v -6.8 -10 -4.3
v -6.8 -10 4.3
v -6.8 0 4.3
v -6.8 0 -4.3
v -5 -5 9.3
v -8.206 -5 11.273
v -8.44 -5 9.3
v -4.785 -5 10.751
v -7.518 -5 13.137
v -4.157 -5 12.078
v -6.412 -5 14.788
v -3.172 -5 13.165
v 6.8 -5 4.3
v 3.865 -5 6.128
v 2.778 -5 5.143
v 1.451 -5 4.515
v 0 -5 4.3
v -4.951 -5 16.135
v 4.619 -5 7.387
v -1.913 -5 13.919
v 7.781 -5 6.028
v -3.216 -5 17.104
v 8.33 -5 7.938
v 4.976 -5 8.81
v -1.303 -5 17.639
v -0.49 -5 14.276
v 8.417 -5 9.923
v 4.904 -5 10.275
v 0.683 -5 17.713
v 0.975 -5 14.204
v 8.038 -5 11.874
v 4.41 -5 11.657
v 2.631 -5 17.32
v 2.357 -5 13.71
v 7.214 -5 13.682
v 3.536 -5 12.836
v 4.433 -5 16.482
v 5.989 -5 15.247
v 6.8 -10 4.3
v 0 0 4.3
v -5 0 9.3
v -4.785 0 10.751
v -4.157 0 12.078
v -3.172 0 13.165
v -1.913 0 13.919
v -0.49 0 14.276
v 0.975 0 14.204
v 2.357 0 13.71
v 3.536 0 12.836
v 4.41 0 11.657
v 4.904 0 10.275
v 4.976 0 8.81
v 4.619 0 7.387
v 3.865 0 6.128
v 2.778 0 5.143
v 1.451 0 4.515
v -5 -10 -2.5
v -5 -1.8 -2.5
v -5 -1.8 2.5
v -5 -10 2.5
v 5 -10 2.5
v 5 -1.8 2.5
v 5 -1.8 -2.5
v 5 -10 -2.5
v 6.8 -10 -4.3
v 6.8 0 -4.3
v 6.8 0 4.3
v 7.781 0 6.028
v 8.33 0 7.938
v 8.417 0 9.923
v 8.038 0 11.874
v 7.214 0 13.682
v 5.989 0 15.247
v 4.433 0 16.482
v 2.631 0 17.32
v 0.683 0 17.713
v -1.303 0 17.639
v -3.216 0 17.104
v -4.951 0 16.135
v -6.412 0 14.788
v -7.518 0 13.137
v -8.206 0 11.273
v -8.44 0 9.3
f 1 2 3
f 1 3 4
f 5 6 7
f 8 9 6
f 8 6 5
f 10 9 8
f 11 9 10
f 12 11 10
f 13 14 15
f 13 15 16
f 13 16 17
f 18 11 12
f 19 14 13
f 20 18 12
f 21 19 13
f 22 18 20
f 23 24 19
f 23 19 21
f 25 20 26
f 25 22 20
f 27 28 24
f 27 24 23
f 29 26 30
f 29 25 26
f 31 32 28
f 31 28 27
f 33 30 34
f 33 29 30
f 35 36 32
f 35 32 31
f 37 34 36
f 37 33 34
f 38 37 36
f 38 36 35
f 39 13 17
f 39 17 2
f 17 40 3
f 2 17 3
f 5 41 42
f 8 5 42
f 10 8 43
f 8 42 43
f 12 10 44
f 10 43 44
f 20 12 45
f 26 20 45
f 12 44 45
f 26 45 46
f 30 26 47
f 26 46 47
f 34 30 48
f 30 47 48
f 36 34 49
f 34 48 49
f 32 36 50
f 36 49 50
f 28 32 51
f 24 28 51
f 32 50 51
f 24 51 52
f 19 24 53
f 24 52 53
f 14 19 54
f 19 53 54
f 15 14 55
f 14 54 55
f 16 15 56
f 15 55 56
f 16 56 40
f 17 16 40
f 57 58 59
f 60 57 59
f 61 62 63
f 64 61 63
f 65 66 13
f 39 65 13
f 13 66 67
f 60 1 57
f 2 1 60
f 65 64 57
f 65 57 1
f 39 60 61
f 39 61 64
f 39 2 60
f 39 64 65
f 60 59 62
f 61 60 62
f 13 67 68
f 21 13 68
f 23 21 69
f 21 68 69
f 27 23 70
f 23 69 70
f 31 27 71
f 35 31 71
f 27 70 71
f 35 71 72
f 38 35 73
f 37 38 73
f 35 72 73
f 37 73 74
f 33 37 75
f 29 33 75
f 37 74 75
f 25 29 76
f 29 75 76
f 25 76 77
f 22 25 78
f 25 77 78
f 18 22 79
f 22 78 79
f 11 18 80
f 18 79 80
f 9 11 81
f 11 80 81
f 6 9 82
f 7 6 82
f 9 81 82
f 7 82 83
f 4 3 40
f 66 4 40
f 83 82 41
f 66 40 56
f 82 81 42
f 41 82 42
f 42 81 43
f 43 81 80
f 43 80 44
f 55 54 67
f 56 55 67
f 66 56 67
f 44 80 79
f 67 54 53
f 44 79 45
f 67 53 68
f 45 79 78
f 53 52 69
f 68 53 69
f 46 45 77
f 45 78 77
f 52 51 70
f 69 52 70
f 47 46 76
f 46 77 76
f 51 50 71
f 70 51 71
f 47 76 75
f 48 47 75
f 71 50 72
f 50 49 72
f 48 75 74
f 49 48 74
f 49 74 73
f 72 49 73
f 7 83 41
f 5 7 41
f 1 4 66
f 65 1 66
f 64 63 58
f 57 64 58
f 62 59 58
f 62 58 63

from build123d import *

# Parameters (mm, degrees)
F1_DEPTH = 10
F2_DEPTH = 1.8
F3_DEPTH = 5


with BuildPart() as f1:
    # F0 (on Front) → F1 (new body)
    with BuildSketch(Plane.XZ):
        with BuildLine():
            Line((-5, -2.5), (-5, 2.5))
            ThreePointArc((-5, 2.5), (-5.968249, 3.331751), (-6.8, 4.3))
            Line((-6.8, 4.3), (-6.8, -4.3))
            Line((-6.8, -4.3), (6.8, -4.3))
            Line((6.8, -4.3), (6.8, 4.3))
            ThreePointArc((6.8, 4.3), (5.968249, 3.331751), (5, 2.5))
            Line((5, 2.5), (5, -2.5))
            Line((5, -2.5), (-5, -2.5))
        make_face()
        with BuildLine():
            ThreePointArc((-6.8, 4.3), (-5.968249, 3.331751), (-5, 2.5))
            Line((-5, 2.5), (5, 2.5))
            ThreePointArc((5, 2.5), (5.968249, 3.331751), (6.8, 4.3))
            Line((6.8, 4.3), (0, 4.3))
            Line((0, 4.3), (-6.8, 4.3))
        make_face()
    extrude(amount=F1_DEPTH)

    # F0 (on Front) → F2 (join)
    with BuildSketch(Plane.XZ):
        with BuildLine():
            Line((5, 2.5), (-5, 2.5))
            ThreePointArc((-5, 2.5), (0, 0.859621), (5, 2.5))
        make_face()
        with BuildLine():
            ThreePointArc((5, 2.5), (0, 0.859621), (-5, 2.5))
            Line((-5, 2.5), (-5, -2.5))
            Line((-5, -2.5), (5, -2.5))
            Line((5, -2.5), (5, 2.5))
        make_face()
    extrude(amount=F2_DEPTH)

    # F0 (on Front) → F3 (join)
    with BuildSketch(Plane.XZ):
        with BuildLine():
            Line((0, 4.3), (6.8, 4.3))
            ThreePointArc((6.8, 4.3), (2.631105, 17.319806), (-8.440379, 9.3))
            Line((-8.440379, 9.3), (-5, 9.3))
            ThreePointArc((-5, 9.3), (3.535534, 12.835534), (0, 4.3))
        make_face()
    extrude(amount=F3_DEPTH)


solid = f1.part
